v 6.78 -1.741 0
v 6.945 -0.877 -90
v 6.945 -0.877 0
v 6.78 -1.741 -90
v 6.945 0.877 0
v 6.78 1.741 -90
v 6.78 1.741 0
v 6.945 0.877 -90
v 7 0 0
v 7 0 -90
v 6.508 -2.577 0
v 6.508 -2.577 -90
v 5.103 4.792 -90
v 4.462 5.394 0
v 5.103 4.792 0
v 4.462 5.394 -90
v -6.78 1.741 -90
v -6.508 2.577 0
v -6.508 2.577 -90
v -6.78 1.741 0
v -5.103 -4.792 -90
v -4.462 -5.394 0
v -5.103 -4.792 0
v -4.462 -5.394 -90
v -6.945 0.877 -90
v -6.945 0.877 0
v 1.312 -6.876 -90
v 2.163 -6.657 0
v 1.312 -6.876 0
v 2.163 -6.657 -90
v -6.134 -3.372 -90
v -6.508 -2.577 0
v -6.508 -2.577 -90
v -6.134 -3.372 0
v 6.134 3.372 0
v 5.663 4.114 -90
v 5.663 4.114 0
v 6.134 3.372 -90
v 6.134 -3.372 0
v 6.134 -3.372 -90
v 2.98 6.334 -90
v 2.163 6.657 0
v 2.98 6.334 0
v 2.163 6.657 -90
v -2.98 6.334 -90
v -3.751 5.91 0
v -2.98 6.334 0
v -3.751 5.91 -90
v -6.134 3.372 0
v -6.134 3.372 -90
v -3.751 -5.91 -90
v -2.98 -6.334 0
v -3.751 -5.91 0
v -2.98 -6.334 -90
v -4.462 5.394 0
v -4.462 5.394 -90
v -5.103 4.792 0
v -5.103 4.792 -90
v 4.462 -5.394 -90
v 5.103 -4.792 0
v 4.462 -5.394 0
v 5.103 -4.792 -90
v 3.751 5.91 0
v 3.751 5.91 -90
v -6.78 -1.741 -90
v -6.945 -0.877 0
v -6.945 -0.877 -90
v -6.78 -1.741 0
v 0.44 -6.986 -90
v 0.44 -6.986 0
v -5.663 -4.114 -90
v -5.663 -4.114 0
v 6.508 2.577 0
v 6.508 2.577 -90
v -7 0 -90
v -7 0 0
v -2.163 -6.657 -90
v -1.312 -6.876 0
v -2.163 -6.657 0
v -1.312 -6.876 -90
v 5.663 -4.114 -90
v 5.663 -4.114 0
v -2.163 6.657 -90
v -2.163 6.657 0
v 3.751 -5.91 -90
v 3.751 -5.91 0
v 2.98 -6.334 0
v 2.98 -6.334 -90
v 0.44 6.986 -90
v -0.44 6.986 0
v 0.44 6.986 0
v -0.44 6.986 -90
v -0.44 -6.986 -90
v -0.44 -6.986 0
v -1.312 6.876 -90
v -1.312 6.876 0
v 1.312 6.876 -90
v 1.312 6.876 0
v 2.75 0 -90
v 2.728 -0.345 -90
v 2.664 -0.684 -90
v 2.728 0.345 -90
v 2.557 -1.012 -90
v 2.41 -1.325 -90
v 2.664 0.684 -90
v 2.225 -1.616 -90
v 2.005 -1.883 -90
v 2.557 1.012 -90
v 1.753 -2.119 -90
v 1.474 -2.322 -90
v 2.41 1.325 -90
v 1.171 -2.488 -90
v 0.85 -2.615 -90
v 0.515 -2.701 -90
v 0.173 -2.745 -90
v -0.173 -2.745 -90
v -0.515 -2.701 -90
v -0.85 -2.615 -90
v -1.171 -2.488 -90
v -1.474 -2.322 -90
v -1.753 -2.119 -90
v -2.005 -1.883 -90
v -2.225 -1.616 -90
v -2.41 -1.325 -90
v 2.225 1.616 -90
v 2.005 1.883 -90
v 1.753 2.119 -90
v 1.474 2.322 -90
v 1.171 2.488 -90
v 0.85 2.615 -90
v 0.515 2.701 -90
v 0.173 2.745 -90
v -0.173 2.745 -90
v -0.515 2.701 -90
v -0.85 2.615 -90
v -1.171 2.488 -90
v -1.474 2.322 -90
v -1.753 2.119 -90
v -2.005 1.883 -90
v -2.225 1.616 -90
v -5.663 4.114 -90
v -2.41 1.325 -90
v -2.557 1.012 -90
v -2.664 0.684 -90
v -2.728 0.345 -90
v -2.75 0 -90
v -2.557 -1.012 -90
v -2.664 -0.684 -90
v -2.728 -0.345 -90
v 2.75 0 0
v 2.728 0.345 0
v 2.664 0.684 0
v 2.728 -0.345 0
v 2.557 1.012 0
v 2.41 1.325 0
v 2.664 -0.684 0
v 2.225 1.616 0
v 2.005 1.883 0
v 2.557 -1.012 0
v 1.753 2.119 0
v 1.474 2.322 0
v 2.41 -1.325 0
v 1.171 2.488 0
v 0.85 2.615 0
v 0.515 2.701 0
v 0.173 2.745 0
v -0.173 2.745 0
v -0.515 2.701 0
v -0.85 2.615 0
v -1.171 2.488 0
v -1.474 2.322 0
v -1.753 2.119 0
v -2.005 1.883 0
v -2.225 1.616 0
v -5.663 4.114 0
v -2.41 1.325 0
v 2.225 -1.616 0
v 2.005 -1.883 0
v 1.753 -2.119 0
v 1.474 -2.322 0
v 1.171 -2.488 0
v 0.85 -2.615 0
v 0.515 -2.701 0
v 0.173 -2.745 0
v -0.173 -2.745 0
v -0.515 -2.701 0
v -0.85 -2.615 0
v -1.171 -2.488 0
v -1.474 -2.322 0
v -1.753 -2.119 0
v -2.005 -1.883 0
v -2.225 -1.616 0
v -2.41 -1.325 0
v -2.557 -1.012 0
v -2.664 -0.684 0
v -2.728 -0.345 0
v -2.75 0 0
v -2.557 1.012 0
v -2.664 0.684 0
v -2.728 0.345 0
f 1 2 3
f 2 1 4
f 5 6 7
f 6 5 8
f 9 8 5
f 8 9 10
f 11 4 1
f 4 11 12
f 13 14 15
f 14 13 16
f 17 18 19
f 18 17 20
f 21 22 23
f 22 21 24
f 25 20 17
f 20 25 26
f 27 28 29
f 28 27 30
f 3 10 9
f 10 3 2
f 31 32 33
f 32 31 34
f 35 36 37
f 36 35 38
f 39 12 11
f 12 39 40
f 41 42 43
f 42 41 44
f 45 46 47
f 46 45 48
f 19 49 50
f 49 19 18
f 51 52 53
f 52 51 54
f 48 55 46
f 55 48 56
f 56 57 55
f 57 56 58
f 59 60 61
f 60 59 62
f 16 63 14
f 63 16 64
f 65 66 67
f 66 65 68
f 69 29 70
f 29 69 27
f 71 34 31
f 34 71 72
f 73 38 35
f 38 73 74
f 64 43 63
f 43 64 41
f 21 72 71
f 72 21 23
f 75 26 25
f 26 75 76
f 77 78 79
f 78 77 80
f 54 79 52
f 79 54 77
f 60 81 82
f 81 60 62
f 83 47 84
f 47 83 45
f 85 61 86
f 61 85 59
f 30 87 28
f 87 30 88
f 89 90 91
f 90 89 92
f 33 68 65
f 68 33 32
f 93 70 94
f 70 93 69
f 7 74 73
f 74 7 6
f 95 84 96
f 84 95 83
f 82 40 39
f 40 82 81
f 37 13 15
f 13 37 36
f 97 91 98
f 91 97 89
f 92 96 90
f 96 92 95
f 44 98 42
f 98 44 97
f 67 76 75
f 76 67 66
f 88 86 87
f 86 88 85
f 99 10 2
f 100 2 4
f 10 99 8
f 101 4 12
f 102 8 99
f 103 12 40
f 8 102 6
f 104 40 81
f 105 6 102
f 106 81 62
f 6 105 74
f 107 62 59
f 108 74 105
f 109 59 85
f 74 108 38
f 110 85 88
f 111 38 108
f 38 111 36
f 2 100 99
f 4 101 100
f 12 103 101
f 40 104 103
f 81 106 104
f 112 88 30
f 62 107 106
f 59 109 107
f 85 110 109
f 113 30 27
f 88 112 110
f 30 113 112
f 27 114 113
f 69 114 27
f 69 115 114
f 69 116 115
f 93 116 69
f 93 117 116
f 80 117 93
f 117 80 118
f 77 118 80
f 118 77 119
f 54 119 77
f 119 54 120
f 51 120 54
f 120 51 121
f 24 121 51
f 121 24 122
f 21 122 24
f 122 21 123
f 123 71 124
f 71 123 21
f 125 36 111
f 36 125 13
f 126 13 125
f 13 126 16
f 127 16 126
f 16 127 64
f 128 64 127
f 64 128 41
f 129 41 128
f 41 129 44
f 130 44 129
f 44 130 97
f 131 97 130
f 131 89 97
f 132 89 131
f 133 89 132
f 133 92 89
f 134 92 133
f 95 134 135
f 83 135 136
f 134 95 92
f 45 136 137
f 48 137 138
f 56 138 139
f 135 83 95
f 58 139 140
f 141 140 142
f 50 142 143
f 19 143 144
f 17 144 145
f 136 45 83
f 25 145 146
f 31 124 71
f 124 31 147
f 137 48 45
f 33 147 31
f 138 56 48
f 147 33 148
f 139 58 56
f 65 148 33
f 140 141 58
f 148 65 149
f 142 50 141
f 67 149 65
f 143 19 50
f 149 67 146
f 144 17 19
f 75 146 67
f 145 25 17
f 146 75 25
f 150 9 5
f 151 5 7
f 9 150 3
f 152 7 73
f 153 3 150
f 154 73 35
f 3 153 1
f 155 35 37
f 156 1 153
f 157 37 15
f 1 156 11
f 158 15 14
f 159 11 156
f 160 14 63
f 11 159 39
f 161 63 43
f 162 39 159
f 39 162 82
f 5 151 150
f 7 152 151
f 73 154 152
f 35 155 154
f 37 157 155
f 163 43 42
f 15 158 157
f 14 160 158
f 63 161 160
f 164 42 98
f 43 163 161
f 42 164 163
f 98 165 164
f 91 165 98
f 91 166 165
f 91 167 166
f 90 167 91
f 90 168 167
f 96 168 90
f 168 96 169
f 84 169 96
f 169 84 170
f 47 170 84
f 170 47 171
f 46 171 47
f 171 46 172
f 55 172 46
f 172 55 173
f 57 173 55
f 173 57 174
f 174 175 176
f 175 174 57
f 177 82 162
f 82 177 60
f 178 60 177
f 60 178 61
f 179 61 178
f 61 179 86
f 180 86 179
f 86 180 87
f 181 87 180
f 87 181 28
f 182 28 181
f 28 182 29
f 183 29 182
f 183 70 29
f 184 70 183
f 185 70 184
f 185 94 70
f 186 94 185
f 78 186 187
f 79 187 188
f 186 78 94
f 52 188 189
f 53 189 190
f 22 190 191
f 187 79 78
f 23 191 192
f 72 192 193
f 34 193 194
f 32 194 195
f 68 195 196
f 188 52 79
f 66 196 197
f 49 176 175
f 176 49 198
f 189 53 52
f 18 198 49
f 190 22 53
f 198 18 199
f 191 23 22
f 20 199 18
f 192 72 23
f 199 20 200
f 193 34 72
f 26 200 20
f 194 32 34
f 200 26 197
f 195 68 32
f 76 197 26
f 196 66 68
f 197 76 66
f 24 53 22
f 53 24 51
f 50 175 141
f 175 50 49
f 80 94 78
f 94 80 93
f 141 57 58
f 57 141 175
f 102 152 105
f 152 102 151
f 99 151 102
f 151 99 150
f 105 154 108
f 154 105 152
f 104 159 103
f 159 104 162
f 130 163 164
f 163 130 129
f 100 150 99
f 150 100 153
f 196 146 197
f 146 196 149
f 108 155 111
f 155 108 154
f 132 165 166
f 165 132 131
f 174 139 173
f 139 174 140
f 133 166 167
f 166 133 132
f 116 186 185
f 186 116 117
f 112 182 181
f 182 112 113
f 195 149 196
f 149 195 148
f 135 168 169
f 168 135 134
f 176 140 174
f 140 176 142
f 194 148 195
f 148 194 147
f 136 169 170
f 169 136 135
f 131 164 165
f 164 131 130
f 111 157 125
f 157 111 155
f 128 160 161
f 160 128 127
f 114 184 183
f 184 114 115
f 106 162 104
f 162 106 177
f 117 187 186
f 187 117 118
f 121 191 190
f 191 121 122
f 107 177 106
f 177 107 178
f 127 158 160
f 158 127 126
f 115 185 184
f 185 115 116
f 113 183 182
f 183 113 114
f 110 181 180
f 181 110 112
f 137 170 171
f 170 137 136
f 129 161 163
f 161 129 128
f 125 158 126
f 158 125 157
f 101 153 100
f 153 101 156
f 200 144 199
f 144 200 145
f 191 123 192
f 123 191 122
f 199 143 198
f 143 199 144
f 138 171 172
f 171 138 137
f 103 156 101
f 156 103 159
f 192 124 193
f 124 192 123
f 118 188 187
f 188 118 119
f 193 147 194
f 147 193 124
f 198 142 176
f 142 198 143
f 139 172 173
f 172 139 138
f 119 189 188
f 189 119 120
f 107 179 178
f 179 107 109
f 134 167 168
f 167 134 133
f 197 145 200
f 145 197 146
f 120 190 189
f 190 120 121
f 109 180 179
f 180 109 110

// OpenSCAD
$fn = 50;


difference() {
	union() {
		translate(v = [0, 0, -90.0000000000]) {
			cylinder(h = 90, r = 7.0000000000);
		}
		cylinder(h = 0, r = 13.0000000000);
	}
	union() {
		#translate(v = [0, 0, -90]) {
			cylinder(h = 90, r = 2.7500000000);
		}
	}
}
